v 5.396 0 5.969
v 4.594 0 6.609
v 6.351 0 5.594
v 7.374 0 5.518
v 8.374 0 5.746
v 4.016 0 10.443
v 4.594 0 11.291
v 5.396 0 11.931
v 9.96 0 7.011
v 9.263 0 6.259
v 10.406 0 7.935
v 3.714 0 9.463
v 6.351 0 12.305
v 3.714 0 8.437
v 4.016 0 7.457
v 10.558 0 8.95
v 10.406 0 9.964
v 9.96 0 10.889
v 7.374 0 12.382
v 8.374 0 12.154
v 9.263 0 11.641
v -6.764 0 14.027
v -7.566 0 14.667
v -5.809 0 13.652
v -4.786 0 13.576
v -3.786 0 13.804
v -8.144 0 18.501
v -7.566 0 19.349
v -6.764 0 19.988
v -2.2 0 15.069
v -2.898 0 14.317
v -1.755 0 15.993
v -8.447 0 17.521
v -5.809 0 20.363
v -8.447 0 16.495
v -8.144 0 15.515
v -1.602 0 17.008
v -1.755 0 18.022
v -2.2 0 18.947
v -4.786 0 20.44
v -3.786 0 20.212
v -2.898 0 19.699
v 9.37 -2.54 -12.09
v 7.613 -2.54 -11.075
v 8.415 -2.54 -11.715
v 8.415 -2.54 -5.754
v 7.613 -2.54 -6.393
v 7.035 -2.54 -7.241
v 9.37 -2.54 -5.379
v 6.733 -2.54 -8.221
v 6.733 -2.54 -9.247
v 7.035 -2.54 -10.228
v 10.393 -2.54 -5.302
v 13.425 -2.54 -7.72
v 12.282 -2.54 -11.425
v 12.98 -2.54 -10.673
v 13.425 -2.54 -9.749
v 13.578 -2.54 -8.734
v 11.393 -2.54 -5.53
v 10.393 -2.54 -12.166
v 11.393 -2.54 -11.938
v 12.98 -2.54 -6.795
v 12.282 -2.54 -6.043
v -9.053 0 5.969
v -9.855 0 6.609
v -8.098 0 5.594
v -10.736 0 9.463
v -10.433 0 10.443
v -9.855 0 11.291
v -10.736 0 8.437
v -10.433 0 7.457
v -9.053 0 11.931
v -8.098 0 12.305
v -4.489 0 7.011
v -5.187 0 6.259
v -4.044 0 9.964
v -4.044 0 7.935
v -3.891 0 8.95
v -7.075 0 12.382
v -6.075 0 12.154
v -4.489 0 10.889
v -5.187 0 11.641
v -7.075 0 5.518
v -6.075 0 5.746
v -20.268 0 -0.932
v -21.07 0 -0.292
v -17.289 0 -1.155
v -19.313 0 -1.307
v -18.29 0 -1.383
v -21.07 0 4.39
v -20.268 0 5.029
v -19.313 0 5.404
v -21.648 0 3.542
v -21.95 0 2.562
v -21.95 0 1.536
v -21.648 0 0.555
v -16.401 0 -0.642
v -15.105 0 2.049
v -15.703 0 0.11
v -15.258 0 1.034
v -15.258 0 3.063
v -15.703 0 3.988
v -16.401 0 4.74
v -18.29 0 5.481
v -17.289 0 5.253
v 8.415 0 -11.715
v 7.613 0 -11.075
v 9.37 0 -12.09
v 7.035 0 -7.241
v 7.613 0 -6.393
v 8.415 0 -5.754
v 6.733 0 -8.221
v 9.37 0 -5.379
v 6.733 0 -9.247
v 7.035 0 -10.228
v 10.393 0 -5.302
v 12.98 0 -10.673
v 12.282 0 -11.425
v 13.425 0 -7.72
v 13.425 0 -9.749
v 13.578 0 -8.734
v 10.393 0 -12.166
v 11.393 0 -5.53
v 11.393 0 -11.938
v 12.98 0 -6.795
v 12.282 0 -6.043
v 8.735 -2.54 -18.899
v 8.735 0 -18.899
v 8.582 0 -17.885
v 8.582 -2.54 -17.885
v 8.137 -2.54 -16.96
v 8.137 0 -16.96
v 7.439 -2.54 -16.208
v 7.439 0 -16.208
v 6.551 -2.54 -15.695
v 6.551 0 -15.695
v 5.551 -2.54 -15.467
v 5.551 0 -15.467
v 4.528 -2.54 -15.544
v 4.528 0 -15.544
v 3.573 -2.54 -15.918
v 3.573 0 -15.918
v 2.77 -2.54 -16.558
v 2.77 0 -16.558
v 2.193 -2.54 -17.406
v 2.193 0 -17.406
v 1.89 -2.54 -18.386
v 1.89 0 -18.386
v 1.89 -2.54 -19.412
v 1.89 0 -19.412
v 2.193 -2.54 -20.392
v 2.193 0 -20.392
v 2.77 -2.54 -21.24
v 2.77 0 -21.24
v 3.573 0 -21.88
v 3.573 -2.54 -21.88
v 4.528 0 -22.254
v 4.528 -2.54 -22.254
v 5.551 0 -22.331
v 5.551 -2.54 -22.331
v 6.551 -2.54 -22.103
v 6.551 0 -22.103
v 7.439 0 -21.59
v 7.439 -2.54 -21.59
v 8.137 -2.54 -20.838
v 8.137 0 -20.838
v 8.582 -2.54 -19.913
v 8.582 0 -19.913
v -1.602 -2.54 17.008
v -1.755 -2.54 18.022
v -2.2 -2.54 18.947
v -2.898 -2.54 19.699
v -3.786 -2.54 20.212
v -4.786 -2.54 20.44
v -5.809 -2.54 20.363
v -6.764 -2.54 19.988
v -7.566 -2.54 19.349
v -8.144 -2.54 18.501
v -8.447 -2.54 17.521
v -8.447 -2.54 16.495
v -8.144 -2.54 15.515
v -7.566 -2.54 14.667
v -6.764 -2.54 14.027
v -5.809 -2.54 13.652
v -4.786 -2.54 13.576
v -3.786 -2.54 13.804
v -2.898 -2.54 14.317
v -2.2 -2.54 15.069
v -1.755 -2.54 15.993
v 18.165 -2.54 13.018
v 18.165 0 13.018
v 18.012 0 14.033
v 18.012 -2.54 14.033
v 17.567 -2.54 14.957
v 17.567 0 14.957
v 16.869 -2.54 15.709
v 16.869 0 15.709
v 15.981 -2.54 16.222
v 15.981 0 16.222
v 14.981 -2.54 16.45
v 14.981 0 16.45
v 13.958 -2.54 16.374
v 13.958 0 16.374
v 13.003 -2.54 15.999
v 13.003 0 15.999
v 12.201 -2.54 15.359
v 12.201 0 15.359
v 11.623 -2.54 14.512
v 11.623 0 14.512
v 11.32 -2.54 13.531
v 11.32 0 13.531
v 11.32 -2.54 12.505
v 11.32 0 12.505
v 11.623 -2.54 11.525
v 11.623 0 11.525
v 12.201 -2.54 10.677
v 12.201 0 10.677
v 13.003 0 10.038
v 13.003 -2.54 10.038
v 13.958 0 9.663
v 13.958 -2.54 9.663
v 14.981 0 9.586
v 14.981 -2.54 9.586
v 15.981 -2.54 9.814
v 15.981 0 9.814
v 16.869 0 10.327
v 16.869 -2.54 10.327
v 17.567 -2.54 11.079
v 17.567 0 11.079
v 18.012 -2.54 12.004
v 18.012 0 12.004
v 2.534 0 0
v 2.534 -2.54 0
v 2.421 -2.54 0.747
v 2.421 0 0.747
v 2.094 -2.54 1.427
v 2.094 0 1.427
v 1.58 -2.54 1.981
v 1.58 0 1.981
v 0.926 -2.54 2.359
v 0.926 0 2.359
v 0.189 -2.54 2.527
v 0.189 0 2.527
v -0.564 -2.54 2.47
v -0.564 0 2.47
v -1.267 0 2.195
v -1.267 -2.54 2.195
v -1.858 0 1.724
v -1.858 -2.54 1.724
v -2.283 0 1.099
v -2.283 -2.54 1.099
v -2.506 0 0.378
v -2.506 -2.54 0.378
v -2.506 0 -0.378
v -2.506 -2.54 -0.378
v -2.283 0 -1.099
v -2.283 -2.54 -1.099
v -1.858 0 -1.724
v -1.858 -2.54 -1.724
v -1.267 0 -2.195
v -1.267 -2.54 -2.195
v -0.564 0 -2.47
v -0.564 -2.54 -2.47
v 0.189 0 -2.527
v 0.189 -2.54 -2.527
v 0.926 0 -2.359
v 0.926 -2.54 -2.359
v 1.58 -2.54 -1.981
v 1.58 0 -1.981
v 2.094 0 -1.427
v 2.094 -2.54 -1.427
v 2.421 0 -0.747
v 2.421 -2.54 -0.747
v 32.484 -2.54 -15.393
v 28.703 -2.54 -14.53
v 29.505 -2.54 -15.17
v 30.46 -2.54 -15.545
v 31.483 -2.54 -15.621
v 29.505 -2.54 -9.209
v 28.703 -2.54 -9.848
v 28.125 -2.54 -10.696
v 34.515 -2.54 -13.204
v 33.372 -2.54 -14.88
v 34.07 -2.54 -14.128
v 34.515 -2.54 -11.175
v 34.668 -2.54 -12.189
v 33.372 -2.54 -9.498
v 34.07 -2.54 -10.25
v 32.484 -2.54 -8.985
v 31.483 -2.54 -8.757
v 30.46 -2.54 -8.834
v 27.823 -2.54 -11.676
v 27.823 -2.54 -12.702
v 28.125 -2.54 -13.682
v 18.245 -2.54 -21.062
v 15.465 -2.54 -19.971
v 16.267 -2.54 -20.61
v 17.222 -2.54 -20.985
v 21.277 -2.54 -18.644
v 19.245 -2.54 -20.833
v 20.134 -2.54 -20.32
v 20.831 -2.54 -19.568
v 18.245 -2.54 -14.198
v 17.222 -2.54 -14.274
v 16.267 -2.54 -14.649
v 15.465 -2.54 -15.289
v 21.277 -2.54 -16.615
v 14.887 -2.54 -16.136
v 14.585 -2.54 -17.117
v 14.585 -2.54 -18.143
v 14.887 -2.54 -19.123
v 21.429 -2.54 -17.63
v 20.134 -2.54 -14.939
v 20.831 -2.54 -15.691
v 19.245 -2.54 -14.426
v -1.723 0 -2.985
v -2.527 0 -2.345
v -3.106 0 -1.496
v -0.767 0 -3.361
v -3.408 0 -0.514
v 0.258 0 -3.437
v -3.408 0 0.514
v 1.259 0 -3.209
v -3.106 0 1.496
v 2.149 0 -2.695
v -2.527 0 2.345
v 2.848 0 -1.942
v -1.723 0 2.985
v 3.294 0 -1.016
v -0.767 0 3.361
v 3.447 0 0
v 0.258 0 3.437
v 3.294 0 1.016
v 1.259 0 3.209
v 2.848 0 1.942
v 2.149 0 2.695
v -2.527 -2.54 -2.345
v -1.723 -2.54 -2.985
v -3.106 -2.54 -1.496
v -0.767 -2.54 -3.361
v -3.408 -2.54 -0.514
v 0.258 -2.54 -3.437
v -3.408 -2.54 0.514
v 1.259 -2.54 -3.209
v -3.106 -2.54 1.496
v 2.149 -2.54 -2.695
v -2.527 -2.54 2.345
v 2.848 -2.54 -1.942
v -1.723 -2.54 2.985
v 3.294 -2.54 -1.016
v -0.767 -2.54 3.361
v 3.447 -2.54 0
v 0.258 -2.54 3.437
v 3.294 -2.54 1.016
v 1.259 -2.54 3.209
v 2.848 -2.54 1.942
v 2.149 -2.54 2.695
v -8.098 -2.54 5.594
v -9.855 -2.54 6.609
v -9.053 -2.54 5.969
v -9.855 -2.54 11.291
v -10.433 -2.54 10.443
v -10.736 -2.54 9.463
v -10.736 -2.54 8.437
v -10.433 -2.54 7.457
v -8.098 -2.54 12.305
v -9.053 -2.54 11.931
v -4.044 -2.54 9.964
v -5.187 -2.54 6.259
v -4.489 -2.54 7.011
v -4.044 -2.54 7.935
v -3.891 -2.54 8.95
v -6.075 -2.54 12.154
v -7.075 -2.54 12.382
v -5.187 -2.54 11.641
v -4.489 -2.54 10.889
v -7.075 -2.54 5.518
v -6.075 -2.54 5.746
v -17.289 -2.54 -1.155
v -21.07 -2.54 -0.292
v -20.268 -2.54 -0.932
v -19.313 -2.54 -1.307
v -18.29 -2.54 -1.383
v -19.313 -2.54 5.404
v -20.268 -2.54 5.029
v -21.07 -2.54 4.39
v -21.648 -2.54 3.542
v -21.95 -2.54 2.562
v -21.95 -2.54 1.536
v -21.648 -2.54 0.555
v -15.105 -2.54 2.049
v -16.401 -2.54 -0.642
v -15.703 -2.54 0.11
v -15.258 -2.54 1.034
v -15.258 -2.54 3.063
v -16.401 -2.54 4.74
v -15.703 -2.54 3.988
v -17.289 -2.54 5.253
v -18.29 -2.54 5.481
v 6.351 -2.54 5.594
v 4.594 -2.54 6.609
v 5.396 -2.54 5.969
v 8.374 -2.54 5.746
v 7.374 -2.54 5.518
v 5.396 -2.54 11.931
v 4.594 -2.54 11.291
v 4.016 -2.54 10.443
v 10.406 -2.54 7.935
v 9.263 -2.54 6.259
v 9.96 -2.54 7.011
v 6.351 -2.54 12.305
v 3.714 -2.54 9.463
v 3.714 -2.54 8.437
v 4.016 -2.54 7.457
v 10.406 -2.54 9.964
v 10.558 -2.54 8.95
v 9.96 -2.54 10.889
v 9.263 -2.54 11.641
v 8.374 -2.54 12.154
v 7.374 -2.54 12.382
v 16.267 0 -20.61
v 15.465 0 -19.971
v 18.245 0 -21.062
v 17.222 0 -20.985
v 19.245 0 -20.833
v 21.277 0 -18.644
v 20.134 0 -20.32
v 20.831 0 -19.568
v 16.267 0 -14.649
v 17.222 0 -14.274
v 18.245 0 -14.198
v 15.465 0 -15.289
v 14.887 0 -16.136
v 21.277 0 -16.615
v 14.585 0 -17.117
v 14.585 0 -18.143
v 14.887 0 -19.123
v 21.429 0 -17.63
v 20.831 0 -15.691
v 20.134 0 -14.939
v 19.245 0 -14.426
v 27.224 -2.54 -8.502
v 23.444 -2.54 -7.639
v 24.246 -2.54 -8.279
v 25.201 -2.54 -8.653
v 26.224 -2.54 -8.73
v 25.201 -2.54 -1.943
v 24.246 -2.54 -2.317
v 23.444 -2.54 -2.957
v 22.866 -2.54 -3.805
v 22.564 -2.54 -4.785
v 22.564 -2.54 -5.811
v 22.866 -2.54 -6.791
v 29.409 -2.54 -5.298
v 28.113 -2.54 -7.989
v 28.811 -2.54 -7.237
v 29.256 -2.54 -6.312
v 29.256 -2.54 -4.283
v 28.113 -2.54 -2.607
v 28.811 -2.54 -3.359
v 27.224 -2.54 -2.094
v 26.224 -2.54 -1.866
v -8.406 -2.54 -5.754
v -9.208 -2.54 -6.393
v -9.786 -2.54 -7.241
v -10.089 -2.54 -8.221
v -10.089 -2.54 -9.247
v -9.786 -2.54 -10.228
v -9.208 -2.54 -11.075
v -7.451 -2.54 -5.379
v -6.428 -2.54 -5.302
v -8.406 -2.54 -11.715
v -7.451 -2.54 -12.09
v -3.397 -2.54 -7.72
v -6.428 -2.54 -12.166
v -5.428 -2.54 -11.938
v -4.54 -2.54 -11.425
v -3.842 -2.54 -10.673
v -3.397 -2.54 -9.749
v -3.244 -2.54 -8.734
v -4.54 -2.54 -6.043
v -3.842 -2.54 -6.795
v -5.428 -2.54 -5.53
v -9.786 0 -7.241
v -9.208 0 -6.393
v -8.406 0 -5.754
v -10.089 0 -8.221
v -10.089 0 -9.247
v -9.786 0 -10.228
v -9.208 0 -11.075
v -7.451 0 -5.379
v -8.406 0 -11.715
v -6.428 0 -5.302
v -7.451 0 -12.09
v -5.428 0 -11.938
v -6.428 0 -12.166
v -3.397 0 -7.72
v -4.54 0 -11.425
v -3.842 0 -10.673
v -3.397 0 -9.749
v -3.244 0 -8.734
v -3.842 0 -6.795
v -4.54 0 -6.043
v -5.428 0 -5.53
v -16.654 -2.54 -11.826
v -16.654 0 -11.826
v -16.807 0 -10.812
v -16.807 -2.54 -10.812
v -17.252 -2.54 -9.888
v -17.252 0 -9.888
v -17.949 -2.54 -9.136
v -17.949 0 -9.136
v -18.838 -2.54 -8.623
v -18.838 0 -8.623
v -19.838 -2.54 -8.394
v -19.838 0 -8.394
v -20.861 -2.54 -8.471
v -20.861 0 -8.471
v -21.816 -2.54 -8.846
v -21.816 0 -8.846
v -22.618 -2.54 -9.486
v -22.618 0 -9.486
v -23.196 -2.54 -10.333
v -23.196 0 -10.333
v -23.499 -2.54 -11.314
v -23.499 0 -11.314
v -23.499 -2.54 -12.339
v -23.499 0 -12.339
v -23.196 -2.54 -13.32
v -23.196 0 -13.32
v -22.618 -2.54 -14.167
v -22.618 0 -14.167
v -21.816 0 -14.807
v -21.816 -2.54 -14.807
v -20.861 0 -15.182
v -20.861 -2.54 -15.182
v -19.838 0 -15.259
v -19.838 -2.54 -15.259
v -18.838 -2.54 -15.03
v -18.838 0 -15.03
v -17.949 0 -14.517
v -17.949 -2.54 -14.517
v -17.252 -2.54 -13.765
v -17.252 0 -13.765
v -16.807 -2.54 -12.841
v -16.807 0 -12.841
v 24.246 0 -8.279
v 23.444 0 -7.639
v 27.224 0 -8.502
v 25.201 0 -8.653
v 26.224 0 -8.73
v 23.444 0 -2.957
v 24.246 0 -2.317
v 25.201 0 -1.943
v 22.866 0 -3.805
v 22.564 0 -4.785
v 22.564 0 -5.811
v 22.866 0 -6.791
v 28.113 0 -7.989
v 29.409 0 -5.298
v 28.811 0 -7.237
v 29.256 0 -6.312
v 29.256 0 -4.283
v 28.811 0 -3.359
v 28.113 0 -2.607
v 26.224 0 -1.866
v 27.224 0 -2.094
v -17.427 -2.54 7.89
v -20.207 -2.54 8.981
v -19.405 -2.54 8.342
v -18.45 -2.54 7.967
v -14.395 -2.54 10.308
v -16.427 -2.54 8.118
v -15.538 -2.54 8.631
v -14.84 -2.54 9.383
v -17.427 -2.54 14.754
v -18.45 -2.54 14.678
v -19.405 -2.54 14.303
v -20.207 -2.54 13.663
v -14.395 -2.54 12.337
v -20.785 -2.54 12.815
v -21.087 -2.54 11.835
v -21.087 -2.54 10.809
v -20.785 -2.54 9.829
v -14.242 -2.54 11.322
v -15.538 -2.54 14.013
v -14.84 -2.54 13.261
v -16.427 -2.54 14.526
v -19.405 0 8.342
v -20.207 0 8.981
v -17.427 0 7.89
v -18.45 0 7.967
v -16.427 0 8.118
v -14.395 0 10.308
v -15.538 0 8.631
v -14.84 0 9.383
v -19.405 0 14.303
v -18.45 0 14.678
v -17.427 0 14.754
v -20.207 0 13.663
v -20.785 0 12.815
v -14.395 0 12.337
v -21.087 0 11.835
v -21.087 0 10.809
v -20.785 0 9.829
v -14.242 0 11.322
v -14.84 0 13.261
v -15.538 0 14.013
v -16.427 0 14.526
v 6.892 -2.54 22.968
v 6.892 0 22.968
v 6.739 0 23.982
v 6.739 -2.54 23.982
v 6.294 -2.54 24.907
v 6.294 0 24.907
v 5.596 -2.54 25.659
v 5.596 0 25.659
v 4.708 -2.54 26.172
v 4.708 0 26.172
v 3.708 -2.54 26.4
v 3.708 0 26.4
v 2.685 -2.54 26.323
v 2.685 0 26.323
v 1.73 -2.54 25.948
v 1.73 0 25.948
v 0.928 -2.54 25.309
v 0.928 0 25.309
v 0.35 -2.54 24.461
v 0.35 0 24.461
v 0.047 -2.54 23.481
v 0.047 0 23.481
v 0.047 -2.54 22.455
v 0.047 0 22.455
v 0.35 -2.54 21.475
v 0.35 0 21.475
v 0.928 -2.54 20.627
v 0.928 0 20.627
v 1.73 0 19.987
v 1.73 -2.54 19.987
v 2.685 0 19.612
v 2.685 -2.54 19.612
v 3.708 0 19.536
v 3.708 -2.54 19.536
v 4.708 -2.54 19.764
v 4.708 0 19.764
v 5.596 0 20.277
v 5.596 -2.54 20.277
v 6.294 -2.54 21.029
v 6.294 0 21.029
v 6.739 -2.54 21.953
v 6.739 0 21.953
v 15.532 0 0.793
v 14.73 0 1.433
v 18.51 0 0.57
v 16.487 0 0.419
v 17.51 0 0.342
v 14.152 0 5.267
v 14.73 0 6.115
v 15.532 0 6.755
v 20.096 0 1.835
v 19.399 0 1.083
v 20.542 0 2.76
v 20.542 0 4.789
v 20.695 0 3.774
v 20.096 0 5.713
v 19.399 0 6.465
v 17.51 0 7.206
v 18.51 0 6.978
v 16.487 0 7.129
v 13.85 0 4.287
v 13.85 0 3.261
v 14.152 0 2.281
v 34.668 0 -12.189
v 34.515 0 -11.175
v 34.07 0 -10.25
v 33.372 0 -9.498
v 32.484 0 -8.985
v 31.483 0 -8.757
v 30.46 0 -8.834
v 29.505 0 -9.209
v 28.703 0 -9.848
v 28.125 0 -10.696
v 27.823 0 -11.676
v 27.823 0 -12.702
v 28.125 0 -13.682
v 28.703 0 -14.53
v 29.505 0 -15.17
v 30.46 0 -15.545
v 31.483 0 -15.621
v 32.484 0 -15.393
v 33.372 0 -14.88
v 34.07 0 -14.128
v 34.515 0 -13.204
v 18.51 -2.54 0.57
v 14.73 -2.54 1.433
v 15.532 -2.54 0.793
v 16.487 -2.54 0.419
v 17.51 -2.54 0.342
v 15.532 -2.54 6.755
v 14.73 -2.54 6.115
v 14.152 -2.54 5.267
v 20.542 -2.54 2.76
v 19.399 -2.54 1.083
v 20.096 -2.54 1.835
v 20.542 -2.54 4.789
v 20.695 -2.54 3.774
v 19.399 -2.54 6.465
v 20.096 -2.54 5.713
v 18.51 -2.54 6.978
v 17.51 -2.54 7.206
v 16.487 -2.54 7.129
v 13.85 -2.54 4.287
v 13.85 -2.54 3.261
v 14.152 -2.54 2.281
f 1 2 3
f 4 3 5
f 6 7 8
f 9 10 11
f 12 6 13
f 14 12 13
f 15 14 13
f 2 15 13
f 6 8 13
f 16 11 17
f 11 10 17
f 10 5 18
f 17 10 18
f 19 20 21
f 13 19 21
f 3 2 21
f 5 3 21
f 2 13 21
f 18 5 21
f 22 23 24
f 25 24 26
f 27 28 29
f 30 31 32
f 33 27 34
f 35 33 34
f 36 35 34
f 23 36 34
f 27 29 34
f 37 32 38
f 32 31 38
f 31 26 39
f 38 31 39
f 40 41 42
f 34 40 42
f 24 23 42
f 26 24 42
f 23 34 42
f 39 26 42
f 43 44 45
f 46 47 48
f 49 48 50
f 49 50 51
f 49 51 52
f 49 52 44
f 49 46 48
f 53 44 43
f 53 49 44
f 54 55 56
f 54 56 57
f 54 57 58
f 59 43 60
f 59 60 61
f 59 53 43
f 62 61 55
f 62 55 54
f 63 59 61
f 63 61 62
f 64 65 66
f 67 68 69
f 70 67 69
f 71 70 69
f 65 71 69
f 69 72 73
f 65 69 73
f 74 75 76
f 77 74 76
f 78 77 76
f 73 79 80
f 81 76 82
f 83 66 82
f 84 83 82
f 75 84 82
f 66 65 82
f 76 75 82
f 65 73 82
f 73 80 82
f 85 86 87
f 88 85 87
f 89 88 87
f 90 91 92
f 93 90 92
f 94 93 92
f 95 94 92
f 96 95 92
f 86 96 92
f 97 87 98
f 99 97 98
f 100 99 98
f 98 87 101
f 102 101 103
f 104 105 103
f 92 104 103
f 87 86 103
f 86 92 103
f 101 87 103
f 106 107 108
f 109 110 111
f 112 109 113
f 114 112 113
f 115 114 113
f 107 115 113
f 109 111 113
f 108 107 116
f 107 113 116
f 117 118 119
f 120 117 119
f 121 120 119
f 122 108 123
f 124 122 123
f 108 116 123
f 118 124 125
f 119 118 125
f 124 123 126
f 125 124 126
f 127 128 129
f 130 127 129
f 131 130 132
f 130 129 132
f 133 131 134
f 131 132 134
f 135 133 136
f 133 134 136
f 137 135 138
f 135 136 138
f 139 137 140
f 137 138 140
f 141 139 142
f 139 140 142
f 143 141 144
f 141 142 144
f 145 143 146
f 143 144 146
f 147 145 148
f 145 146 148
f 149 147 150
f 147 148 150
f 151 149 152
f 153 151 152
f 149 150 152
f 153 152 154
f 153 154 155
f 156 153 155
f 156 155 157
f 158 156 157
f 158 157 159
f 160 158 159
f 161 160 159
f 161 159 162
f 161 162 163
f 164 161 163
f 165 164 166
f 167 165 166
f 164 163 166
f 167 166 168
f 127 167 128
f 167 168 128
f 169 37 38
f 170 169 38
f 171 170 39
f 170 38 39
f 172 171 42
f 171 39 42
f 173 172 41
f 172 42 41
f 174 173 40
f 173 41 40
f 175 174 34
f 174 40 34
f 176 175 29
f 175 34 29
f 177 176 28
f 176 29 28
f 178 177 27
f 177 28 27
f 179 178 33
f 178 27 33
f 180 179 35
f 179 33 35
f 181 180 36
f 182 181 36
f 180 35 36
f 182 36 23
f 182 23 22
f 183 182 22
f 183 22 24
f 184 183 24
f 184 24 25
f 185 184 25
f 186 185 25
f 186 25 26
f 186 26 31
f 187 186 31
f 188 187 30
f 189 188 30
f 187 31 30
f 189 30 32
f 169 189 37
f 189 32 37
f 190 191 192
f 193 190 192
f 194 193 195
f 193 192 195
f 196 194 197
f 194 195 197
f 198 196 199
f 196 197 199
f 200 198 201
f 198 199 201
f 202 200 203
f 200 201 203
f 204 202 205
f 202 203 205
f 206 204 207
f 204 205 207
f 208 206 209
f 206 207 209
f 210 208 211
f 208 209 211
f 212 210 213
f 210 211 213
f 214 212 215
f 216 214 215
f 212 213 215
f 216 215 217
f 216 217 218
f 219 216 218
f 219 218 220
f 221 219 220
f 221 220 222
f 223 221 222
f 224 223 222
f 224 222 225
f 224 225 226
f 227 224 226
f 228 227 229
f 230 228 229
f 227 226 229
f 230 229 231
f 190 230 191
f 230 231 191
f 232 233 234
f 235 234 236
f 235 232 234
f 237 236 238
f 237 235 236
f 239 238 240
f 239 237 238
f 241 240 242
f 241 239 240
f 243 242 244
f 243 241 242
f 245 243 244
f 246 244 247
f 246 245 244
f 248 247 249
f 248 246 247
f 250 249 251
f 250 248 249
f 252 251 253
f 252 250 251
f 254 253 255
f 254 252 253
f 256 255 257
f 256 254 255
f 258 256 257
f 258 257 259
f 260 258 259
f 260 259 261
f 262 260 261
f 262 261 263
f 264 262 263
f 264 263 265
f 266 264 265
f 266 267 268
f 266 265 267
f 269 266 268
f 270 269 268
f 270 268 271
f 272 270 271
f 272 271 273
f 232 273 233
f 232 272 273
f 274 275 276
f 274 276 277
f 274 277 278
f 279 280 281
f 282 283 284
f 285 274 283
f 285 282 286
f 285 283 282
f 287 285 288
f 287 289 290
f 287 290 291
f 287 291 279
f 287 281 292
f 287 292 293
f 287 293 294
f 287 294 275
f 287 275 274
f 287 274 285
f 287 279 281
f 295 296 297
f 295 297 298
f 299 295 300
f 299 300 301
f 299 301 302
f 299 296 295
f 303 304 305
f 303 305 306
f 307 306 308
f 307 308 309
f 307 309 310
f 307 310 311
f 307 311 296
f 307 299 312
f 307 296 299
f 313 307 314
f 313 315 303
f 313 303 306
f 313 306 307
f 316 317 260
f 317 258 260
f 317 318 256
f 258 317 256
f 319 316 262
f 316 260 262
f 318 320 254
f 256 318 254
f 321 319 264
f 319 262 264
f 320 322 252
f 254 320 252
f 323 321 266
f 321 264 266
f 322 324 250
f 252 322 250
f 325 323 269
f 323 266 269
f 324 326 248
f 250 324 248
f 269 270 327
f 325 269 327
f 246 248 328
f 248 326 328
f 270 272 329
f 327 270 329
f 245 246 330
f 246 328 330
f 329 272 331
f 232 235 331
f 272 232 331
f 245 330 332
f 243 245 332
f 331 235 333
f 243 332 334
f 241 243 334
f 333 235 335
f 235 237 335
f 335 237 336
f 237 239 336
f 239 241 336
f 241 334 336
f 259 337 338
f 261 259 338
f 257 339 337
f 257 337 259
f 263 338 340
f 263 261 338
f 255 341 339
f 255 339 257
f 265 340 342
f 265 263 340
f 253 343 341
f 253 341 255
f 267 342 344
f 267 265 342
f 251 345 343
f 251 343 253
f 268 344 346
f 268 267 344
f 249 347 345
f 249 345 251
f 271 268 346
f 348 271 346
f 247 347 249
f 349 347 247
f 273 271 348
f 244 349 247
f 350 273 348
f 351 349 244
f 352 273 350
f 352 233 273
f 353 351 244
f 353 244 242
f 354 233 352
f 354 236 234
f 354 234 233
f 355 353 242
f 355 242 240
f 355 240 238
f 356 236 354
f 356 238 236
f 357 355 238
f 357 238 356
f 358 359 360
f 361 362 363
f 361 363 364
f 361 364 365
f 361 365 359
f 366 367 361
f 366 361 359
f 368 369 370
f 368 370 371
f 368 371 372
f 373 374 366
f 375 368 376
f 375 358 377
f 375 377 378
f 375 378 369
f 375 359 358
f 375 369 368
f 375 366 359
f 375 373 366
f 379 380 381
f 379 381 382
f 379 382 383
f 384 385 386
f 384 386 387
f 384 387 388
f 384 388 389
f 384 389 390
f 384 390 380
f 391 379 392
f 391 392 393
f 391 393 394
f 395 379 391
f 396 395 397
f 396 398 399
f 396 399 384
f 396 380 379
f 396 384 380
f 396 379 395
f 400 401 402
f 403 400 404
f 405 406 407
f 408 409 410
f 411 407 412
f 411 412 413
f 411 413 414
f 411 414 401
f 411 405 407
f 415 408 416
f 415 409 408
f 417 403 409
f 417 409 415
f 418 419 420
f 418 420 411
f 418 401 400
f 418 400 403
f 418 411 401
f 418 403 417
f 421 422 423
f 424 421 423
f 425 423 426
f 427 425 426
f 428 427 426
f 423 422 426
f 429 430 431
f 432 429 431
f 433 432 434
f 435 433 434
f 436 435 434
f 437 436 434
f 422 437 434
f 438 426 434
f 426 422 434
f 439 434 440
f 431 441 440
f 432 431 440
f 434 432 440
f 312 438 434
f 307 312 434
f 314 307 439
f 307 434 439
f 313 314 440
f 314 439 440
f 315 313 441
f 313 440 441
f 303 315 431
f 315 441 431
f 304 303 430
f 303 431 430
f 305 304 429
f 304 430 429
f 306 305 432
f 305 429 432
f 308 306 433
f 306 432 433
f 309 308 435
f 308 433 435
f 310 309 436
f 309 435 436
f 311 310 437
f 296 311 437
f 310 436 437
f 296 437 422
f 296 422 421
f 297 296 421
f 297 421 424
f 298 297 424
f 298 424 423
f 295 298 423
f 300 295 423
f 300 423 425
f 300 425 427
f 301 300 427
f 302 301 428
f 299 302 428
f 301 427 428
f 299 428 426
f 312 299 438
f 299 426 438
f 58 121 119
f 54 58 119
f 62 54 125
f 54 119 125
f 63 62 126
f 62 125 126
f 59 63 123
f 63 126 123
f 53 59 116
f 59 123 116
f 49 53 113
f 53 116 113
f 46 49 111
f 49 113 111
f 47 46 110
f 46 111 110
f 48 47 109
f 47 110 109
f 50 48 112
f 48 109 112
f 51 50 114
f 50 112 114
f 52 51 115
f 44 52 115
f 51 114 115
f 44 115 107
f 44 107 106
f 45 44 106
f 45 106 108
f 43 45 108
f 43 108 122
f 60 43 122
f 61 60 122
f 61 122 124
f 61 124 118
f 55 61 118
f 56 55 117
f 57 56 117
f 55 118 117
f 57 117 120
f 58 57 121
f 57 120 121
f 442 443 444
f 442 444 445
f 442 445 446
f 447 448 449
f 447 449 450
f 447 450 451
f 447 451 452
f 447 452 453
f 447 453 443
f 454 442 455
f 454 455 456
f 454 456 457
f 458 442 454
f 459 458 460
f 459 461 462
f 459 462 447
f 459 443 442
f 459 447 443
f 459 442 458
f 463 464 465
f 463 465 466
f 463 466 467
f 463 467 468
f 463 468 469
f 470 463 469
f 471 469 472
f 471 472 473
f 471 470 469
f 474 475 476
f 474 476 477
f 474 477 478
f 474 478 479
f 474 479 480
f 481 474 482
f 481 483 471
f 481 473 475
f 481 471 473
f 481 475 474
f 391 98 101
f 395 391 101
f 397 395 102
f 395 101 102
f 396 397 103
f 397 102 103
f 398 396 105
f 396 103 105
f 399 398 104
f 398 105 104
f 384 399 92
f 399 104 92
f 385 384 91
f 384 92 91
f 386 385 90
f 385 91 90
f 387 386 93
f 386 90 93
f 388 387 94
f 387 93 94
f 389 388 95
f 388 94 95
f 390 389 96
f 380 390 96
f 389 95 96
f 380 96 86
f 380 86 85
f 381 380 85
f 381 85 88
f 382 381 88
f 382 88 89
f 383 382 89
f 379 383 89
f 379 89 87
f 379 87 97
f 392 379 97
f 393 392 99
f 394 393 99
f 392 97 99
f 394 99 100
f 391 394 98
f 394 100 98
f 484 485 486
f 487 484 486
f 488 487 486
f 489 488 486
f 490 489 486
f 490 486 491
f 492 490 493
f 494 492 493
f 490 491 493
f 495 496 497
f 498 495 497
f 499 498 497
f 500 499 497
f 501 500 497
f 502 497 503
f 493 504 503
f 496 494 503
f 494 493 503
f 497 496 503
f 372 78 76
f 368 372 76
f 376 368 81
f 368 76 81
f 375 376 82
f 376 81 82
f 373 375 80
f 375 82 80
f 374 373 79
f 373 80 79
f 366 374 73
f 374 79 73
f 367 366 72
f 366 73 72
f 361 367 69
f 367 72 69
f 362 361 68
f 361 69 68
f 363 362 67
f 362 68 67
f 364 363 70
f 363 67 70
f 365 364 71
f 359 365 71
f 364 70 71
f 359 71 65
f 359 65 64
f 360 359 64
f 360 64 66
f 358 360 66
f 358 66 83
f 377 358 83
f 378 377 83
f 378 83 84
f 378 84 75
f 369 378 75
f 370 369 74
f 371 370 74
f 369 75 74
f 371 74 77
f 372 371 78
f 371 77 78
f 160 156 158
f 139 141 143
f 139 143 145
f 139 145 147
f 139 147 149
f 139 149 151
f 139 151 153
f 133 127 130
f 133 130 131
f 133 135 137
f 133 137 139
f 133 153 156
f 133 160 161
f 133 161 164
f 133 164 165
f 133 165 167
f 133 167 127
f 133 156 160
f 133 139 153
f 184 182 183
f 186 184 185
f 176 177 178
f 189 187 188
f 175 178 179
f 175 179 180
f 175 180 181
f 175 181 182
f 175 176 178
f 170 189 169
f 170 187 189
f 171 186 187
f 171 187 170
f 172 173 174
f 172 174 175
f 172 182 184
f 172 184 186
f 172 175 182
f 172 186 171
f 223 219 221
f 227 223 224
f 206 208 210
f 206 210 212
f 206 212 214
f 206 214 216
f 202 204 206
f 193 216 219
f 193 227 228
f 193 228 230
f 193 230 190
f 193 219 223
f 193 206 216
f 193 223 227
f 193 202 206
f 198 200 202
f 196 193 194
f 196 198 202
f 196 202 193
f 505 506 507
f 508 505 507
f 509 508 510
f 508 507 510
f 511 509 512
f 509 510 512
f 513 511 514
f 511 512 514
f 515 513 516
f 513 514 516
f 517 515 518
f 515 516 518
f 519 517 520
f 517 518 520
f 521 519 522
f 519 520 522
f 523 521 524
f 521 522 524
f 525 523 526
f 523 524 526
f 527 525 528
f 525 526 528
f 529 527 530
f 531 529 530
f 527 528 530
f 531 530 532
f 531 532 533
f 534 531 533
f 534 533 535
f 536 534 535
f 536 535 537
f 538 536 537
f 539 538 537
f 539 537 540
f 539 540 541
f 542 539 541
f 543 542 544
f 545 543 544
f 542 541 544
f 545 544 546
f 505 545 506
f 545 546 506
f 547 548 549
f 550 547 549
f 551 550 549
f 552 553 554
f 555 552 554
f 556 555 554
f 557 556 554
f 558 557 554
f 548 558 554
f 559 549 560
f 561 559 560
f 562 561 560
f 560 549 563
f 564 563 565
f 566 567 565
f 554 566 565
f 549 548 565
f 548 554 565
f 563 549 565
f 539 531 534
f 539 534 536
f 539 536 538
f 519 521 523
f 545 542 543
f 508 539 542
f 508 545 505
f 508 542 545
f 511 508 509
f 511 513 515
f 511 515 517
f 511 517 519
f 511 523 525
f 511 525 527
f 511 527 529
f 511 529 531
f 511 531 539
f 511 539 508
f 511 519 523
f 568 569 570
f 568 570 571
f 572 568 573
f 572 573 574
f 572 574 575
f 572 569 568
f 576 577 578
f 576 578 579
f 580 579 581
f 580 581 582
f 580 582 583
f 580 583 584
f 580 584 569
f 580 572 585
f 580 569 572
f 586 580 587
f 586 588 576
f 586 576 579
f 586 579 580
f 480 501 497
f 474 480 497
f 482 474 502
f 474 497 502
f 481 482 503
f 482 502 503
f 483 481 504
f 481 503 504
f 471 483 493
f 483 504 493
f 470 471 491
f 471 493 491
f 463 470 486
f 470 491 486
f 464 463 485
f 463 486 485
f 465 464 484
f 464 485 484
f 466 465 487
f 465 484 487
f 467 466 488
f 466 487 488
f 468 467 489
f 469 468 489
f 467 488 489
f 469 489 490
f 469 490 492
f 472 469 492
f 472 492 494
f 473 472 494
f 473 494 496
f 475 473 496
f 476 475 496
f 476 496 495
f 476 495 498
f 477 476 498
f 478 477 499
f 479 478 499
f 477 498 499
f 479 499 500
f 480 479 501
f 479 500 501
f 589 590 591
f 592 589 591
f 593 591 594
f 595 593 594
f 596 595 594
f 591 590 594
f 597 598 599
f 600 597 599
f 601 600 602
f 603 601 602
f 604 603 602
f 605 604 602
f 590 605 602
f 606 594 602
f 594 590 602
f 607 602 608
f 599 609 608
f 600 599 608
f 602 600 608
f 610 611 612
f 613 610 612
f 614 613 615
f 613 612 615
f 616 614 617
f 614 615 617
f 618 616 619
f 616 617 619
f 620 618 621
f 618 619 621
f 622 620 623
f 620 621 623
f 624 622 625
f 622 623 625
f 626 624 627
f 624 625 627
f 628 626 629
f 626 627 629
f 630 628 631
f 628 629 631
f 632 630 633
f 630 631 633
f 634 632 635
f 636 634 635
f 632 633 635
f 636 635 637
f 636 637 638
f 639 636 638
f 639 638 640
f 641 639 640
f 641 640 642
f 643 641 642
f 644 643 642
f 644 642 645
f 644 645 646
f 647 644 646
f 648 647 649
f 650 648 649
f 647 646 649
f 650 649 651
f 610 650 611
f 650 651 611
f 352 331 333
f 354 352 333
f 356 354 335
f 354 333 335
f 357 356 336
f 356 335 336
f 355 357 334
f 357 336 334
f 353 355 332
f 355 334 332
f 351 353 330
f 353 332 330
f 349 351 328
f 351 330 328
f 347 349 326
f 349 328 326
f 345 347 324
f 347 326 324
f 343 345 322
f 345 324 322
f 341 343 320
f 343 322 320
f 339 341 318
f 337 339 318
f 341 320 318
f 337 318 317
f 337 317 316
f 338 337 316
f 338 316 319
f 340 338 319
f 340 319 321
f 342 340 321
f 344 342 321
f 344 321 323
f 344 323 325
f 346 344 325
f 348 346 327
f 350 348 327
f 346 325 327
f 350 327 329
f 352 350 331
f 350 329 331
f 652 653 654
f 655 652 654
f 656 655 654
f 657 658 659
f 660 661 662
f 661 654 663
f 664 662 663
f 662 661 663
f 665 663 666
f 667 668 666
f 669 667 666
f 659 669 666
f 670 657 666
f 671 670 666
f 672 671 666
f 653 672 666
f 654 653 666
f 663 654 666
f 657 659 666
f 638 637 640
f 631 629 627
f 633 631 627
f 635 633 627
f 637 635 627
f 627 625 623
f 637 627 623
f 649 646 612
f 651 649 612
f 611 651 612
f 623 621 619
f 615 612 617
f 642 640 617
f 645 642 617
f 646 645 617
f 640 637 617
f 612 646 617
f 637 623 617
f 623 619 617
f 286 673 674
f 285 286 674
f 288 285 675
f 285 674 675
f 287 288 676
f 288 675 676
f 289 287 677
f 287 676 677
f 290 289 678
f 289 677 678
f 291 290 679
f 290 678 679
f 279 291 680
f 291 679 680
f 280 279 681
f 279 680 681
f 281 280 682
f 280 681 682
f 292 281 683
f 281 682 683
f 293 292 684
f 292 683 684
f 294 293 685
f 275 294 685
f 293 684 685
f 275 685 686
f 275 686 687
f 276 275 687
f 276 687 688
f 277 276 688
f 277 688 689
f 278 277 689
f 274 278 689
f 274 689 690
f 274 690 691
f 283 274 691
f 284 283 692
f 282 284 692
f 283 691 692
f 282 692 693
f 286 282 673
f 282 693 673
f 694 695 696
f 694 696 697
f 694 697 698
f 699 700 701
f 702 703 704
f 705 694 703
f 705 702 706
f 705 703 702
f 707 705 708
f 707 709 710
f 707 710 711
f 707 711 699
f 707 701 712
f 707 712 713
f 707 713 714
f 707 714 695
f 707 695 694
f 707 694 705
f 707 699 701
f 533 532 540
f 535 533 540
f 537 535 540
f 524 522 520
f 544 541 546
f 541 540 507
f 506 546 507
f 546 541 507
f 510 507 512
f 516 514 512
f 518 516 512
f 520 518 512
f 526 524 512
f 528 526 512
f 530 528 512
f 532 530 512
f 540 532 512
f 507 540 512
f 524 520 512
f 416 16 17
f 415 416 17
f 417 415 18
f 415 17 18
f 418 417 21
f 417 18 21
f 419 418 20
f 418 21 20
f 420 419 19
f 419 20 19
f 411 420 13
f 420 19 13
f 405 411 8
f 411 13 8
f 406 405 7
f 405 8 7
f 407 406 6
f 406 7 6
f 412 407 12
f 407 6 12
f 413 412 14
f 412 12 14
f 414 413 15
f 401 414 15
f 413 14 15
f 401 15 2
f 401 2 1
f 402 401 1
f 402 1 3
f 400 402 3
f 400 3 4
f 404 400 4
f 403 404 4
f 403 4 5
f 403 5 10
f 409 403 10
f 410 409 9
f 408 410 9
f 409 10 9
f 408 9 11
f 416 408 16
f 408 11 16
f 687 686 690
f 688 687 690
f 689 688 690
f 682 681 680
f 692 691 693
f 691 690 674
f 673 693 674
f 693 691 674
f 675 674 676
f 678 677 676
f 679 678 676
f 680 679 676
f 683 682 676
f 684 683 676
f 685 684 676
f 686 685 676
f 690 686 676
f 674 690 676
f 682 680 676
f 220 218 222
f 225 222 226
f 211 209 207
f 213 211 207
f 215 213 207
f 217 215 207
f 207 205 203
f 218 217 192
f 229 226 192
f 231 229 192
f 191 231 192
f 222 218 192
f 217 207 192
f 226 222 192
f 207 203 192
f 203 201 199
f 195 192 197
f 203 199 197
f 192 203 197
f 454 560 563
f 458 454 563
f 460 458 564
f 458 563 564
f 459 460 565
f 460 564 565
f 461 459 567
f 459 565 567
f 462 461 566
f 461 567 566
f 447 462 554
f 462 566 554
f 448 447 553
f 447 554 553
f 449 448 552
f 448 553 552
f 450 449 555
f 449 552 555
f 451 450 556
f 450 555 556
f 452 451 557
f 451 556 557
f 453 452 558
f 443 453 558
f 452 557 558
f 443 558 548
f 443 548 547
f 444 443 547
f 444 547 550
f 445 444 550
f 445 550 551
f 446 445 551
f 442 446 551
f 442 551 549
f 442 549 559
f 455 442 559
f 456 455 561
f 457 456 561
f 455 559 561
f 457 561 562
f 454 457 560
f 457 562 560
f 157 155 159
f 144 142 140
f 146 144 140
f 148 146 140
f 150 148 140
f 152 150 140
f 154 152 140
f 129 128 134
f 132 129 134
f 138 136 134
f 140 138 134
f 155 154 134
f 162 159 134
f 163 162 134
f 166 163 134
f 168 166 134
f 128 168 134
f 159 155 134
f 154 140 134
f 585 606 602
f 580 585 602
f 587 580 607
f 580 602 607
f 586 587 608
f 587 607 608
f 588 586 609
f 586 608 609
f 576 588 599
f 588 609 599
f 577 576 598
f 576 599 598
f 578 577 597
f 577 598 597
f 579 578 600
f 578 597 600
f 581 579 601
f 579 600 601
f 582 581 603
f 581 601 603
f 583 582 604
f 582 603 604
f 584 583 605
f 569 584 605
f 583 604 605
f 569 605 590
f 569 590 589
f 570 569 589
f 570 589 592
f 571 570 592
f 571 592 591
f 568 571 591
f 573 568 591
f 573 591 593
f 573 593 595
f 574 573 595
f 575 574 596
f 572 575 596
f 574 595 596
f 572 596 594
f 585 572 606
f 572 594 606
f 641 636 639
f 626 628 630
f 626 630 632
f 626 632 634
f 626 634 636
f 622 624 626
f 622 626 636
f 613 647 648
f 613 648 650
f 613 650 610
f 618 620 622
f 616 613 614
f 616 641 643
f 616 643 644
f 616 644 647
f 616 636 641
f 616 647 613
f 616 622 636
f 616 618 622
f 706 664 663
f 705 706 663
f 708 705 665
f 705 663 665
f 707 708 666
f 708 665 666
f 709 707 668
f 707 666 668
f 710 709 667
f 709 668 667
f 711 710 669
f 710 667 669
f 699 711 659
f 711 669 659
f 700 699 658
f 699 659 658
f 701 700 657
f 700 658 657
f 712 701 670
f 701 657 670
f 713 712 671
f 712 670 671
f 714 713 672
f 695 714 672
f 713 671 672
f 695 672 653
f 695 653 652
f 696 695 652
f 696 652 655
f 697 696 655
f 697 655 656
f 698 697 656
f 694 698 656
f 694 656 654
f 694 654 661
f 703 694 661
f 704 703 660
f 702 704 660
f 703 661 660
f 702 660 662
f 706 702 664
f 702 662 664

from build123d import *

# Parameters (mm, degrees)
F0_R     = 3.446999
F1_DEPTH = 2.54
F2_R     = 2.533991
F3_DEPTH = 25.146
F4_R     = 3.4417
F5_DEPTH = 2.54
F6_R     = 3.4417
F7_DEPTH = 2.54


with BuildPart() as f1:
    # F0 (on Front) → F1 (new body)
    with BuildSketch(Plane.XZ):
        Circle(F0_R)
    extrude(amount=F1_DEPTH)

    # F2 (on Front) → F3 (cut)
    with BuildSketch(Plane.XZ):
        Circle(F2_R)
    extrude(amount=F3_DEPTH, mode=Mode.SUBTRACT)


with BuildPart() as f5:
    # F4 (on Front) → F5 (new body)
    with BuildSketch(Plane.XZ):
        with Locations((-18.546794, 2.048773)):
            Circle(F4_R)
        with Locations((17.252831, 3.774057)):
            Circle(F4_R)
        with Locations((7.116792, 8.949906)):
            Circle(F4_R)
        with Locations((-7.332453, 8.949906)):
            Circle(F4_R)
        with Locations((10.136038, -8.734245)):
            Circle(F4_R)
        with Locations((-6.685472, -8.734245)):
            Circle(F4_R)
    extrude(amount=F5_DEPTH)


with BuildPart() as f7:
    # F6 (on Front) → F7 (new body)
    with BuildSketch(Plane.XZ):
        with Locations((-17.68415, 11.32217)):
            Circle(F6_R)
        with Locations((-5.043433, 17.007871)):
            Circle(F6_R)
        with Locations((3.450567, 22.96783)):
            Circle(F6_R)
        with Locations((14.723504, 13.018214)):
            Circle(F6_R)
        with Locations((25.967082, -5.297938)):
            Circle(F6_R)
        with Locations((31.226173, -12.189164)):
            Circle(F6_R)
        with Locations((17.987767, -17.629605)):
            Circle(F6_R)
        with Locations((5.293406, -18.89904)):
            Circle(F6_R)
        with Locations((-20.09532, -11.826468)):
            Circle(F6_R)
    extrude(amount=F7_DEPTH)


solid = Compound([f1.part, f5.part, f7.part])
